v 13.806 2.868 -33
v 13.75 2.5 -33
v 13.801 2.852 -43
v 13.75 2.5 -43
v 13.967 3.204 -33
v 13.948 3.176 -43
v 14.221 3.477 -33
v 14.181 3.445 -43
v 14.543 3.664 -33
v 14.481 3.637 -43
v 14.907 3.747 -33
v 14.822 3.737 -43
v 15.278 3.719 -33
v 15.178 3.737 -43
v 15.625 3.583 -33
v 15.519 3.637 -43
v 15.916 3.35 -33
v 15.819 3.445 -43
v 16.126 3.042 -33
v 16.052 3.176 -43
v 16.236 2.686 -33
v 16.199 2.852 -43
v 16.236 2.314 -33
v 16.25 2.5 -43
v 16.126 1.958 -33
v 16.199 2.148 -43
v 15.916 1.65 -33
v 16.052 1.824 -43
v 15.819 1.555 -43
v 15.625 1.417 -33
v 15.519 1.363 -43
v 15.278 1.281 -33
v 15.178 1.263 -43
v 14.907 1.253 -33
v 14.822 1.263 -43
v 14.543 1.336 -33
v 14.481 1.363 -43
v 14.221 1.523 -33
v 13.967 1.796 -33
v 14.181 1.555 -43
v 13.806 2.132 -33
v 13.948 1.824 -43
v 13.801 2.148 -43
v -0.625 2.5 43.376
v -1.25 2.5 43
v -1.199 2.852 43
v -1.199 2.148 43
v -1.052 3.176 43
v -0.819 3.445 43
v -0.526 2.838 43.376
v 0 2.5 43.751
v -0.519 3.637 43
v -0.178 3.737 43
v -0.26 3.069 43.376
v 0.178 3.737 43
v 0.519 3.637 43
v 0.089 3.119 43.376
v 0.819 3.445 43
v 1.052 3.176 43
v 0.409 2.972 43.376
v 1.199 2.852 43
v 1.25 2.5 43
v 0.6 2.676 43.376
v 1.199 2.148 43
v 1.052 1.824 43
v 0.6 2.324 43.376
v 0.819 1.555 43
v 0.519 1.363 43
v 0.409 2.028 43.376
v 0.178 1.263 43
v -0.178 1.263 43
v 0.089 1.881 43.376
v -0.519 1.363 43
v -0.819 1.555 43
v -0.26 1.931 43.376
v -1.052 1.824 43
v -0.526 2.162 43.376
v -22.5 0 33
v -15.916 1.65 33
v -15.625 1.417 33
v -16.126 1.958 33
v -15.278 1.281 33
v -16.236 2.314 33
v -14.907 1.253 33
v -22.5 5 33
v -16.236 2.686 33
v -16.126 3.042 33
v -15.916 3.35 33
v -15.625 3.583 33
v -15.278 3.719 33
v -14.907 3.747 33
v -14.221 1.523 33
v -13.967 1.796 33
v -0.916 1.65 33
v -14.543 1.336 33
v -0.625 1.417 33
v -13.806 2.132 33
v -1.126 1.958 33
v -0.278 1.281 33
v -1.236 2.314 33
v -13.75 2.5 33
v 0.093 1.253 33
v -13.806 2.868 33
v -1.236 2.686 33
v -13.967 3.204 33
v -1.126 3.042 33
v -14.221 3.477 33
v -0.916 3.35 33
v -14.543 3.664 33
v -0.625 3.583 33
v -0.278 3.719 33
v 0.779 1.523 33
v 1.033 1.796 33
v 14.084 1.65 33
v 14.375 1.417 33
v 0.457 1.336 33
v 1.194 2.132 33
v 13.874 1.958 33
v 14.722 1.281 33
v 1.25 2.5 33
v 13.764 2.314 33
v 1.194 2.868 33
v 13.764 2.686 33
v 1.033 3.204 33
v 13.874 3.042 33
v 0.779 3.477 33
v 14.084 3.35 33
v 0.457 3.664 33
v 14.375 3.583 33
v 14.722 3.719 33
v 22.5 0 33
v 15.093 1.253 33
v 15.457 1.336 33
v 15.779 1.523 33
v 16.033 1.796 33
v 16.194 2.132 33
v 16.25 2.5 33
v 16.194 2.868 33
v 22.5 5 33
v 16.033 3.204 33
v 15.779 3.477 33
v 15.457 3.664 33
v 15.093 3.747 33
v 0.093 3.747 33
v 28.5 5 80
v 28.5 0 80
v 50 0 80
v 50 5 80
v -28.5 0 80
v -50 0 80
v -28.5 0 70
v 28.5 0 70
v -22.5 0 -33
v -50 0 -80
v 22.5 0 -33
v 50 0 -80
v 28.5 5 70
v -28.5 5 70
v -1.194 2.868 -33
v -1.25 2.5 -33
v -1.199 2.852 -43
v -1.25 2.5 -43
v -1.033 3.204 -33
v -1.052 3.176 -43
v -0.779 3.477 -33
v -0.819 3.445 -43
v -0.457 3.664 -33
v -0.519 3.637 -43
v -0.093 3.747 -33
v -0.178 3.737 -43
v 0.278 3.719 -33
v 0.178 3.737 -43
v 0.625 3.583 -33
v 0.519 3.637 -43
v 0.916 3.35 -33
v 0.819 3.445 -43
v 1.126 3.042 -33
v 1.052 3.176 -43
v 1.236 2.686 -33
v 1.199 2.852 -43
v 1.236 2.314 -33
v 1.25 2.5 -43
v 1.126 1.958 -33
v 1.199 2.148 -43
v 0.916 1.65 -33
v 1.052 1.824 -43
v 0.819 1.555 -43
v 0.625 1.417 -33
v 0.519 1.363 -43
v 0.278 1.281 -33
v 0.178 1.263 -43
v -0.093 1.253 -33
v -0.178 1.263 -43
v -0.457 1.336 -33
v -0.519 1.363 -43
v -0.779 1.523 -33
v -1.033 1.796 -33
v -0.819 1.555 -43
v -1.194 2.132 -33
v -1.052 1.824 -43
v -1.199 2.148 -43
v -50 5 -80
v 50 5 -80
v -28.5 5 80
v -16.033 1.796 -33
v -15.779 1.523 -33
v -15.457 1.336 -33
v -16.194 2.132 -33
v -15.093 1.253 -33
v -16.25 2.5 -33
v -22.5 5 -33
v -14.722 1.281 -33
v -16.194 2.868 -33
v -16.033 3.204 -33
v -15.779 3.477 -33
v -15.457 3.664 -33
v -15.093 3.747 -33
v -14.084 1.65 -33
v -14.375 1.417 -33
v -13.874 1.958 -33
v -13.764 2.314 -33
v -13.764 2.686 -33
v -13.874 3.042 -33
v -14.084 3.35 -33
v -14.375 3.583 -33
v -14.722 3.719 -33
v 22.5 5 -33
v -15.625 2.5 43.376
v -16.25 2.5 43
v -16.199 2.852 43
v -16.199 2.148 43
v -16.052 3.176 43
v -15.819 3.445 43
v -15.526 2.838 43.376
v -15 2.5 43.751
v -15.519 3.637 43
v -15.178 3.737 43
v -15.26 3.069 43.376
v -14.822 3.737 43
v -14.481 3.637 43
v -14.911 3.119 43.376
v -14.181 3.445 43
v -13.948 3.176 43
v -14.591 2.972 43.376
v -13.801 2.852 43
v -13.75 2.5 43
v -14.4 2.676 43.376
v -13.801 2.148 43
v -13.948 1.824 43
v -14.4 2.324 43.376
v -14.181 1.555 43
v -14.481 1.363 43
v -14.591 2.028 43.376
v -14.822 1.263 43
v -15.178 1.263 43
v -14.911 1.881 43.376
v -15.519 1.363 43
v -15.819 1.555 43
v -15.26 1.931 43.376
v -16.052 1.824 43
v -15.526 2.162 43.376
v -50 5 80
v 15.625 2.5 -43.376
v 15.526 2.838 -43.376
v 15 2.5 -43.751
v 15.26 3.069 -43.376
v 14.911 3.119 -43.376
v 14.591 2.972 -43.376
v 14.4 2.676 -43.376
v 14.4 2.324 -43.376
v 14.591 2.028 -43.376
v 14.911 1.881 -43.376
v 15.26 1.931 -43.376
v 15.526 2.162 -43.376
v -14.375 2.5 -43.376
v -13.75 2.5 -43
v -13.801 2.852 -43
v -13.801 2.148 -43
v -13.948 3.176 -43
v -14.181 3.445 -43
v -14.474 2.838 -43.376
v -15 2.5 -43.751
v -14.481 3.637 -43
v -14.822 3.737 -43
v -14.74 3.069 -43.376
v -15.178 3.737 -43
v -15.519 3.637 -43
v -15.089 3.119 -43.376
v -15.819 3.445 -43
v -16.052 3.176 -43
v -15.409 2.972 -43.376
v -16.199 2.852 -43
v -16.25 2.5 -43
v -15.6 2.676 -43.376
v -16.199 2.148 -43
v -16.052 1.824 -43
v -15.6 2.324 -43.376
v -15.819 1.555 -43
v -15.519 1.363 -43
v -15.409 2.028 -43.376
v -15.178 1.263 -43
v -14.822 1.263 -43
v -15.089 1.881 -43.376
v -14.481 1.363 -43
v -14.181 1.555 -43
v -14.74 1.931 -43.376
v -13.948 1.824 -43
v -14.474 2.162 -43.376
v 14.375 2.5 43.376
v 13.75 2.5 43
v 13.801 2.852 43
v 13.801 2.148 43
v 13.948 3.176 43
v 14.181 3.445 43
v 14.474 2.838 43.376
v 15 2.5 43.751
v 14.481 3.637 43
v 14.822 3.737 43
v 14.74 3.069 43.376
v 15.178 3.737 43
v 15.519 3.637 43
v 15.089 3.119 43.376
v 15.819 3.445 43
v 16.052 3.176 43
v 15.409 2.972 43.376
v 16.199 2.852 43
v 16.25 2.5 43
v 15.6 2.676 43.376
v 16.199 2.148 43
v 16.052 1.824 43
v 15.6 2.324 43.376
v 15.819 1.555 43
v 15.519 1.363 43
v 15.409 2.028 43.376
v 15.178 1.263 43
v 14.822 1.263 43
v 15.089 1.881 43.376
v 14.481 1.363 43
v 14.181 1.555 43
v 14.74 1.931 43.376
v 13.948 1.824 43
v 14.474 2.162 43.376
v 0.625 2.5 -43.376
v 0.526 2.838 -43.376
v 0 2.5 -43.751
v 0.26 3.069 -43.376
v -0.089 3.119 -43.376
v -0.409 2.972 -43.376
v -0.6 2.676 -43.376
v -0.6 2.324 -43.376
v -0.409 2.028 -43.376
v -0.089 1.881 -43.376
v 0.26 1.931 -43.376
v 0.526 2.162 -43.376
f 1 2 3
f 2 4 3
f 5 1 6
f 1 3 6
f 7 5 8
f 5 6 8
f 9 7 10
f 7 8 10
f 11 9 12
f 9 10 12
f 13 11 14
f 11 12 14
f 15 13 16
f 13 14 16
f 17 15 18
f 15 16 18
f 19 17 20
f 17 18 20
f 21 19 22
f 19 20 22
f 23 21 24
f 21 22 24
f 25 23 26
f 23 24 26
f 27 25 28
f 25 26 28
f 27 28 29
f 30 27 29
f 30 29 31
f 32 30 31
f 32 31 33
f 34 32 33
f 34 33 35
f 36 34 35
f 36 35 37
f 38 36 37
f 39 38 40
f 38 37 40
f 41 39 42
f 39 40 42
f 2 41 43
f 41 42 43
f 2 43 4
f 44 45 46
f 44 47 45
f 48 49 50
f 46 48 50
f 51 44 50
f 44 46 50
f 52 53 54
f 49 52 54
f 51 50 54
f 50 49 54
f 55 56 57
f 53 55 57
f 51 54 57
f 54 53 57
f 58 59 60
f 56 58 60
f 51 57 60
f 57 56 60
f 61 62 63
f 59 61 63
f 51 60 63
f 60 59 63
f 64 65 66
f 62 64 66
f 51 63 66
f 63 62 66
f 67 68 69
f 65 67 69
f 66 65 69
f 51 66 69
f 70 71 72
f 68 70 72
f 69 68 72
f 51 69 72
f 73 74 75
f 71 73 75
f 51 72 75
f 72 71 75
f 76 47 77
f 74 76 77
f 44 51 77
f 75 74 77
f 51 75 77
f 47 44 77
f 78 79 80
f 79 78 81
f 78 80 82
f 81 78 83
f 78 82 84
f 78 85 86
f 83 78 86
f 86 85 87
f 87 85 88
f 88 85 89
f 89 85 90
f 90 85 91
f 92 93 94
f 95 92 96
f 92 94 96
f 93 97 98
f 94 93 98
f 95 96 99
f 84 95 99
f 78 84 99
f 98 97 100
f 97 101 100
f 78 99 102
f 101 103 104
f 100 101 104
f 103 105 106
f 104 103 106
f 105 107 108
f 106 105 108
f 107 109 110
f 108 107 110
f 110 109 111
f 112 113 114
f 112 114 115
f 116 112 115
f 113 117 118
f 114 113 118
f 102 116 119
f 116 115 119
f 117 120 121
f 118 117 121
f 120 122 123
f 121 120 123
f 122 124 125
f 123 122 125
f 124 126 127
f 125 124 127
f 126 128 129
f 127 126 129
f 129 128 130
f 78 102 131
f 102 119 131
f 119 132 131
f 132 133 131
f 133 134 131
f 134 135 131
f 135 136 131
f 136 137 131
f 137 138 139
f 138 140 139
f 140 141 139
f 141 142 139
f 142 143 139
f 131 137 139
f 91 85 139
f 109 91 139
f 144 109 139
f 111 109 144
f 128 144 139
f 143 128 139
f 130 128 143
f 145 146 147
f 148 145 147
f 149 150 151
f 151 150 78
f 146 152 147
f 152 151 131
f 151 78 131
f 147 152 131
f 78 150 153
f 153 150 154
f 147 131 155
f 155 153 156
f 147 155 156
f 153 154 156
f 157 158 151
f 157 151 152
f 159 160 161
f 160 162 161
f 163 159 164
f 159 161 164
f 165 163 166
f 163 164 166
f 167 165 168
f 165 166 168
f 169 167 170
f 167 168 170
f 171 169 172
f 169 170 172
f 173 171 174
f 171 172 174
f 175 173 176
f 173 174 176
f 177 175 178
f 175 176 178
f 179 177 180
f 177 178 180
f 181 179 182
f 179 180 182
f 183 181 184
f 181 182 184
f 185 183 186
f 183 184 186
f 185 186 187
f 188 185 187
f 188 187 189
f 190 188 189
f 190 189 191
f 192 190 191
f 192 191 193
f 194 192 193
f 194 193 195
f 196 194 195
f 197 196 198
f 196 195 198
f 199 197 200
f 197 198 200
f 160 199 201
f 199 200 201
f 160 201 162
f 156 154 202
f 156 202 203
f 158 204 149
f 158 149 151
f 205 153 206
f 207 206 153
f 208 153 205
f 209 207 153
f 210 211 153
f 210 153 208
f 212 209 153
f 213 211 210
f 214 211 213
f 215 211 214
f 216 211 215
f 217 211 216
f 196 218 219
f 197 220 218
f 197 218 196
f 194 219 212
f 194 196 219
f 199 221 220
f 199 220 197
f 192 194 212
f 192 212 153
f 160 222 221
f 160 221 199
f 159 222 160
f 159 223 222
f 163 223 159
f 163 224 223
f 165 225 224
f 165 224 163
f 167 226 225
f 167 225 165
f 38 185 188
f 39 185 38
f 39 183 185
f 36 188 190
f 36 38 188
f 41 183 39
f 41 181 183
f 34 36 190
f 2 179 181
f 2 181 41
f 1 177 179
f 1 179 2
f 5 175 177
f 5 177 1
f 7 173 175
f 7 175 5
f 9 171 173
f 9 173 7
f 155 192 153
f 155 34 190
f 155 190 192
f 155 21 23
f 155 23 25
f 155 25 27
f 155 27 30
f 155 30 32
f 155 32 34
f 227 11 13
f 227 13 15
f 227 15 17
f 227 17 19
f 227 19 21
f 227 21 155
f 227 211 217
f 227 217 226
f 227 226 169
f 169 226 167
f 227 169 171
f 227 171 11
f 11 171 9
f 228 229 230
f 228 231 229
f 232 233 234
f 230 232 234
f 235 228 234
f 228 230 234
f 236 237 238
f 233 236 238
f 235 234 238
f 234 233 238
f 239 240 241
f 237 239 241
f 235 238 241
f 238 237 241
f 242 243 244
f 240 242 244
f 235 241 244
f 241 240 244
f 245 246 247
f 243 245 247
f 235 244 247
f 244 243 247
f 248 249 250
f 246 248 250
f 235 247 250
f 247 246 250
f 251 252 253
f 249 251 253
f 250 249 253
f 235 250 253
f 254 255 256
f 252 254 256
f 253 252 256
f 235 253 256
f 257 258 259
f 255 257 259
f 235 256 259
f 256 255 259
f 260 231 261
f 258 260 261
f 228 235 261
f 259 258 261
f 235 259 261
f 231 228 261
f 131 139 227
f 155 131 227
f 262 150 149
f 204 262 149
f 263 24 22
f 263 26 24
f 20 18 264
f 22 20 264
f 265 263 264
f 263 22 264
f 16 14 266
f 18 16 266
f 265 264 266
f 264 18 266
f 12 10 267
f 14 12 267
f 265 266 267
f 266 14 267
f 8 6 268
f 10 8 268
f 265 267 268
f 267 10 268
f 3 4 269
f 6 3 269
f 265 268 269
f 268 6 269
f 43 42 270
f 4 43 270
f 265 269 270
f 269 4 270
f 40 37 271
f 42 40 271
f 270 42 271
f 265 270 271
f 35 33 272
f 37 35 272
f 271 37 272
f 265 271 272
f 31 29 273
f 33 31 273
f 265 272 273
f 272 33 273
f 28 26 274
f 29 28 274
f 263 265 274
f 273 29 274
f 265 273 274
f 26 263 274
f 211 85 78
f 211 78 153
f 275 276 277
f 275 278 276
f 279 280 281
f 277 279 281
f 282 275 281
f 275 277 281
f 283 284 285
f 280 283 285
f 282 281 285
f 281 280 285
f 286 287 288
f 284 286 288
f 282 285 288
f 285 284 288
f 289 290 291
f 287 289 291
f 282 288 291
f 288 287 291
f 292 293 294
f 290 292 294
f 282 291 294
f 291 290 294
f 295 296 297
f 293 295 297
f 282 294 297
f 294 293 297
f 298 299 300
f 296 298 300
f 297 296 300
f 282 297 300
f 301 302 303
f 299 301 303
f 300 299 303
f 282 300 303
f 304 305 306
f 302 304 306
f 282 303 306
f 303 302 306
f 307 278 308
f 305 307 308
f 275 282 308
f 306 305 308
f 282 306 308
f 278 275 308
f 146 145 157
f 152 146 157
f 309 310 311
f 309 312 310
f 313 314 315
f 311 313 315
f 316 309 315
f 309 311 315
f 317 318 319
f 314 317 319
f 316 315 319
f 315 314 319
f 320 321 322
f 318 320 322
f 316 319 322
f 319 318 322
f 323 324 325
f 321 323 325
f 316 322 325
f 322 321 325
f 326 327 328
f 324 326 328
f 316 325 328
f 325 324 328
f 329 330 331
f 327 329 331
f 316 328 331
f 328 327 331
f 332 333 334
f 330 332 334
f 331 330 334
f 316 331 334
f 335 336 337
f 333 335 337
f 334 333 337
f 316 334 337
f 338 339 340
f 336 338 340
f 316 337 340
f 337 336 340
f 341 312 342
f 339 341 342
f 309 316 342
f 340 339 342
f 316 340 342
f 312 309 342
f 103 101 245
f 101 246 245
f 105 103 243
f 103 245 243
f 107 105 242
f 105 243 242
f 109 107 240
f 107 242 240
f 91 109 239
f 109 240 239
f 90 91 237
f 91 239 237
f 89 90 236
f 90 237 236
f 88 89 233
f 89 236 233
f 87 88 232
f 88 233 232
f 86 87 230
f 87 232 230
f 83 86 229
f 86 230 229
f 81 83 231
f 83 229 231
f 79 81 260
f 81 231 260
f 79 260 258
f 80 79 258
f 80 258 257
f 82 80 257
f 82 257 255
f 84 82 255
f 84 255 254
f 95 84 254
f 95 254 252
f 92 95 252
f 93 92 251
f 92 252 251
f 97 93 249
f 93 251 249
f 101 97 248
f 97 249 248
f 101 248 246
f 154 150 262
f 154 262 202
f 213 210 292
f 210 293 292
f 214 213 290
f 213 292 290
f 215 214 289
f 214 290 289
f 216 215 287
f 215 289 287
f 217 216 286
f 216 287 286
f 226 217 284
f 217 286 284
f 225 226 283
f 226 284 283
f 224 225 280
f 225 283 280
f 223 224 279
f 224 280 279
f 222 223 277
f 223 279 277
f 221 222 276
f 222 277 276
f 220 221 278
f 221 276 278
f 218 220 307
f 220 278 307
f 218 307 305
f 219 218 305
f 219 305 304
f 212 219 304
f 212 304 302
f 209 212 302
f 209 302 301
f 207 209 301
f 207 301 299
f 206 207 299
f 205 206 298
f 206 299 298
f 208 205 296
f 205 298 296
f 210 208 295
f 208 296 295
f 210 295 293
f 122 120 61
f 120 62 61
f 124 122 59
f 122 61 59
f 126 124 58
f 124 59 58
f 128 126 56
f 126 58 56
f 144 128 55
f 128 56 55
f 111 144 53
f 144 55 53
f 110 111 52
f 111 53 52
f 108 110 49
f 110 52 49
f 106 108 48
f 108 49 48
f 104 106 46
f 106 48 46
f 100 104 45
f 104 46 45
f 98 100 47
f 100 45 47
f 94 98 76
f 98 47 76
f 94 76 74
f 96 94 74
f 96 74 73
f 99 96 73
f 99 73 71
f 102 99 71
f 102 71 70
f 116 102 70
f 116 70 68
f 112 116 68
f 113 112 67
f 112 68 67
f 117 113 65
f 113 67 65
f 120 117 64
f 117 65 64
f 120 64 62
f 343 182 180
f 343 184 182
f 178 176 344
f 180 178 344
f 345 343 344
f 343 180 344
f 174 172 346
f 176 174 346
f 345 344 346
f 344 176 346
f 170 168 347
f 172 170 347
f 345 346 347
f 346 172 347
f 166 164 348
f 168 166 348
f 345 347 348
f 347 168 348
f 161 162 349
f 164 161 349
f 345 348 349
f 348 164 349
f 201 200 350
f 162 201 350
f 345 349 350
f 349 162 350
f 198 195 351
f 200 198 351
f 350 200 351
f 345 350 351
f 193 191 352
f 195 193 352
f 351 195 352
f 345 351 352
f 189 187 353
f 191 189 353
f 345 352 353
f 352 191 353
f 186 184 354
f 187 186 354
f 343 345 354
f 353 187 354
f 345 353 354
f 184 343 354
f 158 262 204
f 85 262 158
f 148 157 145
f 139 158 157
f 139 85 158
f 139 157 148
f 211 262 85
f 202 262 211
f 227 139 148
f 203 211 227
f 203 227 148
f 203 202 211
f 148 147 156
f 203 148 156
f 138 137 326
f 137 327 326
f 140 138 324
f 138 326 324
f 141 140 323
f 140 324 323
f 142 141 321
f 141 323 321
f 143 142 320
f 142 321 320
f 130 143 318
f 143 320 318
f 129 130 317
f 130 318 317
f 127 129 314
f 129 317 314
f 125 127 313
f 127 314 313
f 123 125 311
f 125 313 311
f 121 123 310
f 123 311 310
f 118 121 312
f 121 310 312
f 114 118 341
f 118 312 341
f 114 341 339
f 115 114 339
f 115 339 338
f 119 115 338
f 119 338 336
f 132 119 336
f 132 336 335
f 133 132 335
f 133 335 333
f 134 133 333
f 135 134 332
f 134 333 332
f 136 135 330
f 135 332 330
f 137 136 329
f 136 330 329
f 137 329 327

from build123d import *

# Parameters (mm, degrees)
SKETCH1_W                 = 100
SKETCH1_H                 = 160
BOSS_EXTRUDE1_DEPTH       = 5
SKETCH2_W                 = 45
SKETCH2_H                 = 66
CUT_EXTRUDE1_DEPTH        = 95.472218138
F_2_5MM_DOWEL_HOLE1_D     = 2.5
F_2_5MM_DOWEL_HOLE1_DEPTH = 10
F_2_5MM_DOWEL_HOLE1_TIP   = 0.751075774
F_2_5MM_DOWEL_HOLE2_D     = 2.5
F_2_5MM_DOWEL_HOLE2_DEPTH = 10
F_2_5MM_DOWEL_HOLE2_TIP   = 0.751075774
SKETCH8_W                 = 57
SKETCH8_H                 = 20
CUT_EXTRUDE2_DEPTH        = 95.472218138


with BuildPart() as part:
    # Sketch1 → Boss-Extrude1 (new body)
    with BuildSketch(Plane(origin=(0, 0, 0), x_dir=(1, 0, 0), z_dir=(0, 1, 0))):
        Rectangle(SKETCH1_W, SKETCH1_H)
    extrude(amount=BOSS_EXTRUDE1_DEPTH)

    # Sketch2 → Cut-Extrude1 (cut, through all)
    with BuildSketch(Plane(origin=(0, 5, 0), x_dir=(1, 0, 0), z_dir=(0, 1, 0))):
        Rectangle(SKETCH2_W, SKETCH2_H)
    extrude(amount=-CUT_EXTRUDE1_DEPTH, mode=Mode.SUBTRACT)

    # Ø2.5mm Dowel Hole1
    with Locations(Plane.XY.offset(-33)):
        with Locations((0, 2.5), (15, 2.5), (-15, 2.5)):
            Hole(F_2_5MM_DOWEL_HOLE1_D / 2, depth=F_2_5MM_DOWEL_HOLE1_DEPTH)
            with Locations((0, 0, -(F_2_5MM_DOWEL_HOLE1_DEPTH + F_2_5MM_DOWEL_HOLE1_TIP / 2))):  # 118° drill point
                Cone(0, F_2_5MM_DOWEL_HOLE1_D / 2, F_2_5MM_DOWEL_HOLE1_TIP, mode=Mode.SUBTRACT)

    # Ø2.5mm Dowel Hole2
    with Locations(Plane(origin=(0, 0, 33), x_dir=(-1, 0, 0), z_dir=(0, 0, -1))):
        with Locations((0, 2.5), (15, 2.5), (-15, 2.5)):
            Hole(F_2_5MM_DOWEL_HOLE2_D / 2, depth=F_2_5MM_DOWEL_HOLE2_DEPTH)
            with Locations((0, 0, -(F_2_5MM_DOWEL_HOLE2_DEPTH + F_2_5MM_DOWEL_HOLE2_TIP / 2))):  # 118° drill point
                Cone(0, F_2_5MM_DOWEL_HOLE2_D / 2, F_2_5MM_DOWEL_HOLE2_TIP, mode=Mode.SUBTRACT)

    # Sketch8 → Cut-Extrude2 (cut, through all)
    with BuildSketch(Plane(origin=(0, 5, 0), x_dir=(1, 0, 0), z_dir=(0, 1, 0))):
        with Locations((0, -80)):
            Rectangle(SKETCH8_W, SKETCH8_H)
    extrude(amount=-CUT_EXTRUDE2_DEPTH, mode=Mode.SUBTRACT)


solid = part.part
